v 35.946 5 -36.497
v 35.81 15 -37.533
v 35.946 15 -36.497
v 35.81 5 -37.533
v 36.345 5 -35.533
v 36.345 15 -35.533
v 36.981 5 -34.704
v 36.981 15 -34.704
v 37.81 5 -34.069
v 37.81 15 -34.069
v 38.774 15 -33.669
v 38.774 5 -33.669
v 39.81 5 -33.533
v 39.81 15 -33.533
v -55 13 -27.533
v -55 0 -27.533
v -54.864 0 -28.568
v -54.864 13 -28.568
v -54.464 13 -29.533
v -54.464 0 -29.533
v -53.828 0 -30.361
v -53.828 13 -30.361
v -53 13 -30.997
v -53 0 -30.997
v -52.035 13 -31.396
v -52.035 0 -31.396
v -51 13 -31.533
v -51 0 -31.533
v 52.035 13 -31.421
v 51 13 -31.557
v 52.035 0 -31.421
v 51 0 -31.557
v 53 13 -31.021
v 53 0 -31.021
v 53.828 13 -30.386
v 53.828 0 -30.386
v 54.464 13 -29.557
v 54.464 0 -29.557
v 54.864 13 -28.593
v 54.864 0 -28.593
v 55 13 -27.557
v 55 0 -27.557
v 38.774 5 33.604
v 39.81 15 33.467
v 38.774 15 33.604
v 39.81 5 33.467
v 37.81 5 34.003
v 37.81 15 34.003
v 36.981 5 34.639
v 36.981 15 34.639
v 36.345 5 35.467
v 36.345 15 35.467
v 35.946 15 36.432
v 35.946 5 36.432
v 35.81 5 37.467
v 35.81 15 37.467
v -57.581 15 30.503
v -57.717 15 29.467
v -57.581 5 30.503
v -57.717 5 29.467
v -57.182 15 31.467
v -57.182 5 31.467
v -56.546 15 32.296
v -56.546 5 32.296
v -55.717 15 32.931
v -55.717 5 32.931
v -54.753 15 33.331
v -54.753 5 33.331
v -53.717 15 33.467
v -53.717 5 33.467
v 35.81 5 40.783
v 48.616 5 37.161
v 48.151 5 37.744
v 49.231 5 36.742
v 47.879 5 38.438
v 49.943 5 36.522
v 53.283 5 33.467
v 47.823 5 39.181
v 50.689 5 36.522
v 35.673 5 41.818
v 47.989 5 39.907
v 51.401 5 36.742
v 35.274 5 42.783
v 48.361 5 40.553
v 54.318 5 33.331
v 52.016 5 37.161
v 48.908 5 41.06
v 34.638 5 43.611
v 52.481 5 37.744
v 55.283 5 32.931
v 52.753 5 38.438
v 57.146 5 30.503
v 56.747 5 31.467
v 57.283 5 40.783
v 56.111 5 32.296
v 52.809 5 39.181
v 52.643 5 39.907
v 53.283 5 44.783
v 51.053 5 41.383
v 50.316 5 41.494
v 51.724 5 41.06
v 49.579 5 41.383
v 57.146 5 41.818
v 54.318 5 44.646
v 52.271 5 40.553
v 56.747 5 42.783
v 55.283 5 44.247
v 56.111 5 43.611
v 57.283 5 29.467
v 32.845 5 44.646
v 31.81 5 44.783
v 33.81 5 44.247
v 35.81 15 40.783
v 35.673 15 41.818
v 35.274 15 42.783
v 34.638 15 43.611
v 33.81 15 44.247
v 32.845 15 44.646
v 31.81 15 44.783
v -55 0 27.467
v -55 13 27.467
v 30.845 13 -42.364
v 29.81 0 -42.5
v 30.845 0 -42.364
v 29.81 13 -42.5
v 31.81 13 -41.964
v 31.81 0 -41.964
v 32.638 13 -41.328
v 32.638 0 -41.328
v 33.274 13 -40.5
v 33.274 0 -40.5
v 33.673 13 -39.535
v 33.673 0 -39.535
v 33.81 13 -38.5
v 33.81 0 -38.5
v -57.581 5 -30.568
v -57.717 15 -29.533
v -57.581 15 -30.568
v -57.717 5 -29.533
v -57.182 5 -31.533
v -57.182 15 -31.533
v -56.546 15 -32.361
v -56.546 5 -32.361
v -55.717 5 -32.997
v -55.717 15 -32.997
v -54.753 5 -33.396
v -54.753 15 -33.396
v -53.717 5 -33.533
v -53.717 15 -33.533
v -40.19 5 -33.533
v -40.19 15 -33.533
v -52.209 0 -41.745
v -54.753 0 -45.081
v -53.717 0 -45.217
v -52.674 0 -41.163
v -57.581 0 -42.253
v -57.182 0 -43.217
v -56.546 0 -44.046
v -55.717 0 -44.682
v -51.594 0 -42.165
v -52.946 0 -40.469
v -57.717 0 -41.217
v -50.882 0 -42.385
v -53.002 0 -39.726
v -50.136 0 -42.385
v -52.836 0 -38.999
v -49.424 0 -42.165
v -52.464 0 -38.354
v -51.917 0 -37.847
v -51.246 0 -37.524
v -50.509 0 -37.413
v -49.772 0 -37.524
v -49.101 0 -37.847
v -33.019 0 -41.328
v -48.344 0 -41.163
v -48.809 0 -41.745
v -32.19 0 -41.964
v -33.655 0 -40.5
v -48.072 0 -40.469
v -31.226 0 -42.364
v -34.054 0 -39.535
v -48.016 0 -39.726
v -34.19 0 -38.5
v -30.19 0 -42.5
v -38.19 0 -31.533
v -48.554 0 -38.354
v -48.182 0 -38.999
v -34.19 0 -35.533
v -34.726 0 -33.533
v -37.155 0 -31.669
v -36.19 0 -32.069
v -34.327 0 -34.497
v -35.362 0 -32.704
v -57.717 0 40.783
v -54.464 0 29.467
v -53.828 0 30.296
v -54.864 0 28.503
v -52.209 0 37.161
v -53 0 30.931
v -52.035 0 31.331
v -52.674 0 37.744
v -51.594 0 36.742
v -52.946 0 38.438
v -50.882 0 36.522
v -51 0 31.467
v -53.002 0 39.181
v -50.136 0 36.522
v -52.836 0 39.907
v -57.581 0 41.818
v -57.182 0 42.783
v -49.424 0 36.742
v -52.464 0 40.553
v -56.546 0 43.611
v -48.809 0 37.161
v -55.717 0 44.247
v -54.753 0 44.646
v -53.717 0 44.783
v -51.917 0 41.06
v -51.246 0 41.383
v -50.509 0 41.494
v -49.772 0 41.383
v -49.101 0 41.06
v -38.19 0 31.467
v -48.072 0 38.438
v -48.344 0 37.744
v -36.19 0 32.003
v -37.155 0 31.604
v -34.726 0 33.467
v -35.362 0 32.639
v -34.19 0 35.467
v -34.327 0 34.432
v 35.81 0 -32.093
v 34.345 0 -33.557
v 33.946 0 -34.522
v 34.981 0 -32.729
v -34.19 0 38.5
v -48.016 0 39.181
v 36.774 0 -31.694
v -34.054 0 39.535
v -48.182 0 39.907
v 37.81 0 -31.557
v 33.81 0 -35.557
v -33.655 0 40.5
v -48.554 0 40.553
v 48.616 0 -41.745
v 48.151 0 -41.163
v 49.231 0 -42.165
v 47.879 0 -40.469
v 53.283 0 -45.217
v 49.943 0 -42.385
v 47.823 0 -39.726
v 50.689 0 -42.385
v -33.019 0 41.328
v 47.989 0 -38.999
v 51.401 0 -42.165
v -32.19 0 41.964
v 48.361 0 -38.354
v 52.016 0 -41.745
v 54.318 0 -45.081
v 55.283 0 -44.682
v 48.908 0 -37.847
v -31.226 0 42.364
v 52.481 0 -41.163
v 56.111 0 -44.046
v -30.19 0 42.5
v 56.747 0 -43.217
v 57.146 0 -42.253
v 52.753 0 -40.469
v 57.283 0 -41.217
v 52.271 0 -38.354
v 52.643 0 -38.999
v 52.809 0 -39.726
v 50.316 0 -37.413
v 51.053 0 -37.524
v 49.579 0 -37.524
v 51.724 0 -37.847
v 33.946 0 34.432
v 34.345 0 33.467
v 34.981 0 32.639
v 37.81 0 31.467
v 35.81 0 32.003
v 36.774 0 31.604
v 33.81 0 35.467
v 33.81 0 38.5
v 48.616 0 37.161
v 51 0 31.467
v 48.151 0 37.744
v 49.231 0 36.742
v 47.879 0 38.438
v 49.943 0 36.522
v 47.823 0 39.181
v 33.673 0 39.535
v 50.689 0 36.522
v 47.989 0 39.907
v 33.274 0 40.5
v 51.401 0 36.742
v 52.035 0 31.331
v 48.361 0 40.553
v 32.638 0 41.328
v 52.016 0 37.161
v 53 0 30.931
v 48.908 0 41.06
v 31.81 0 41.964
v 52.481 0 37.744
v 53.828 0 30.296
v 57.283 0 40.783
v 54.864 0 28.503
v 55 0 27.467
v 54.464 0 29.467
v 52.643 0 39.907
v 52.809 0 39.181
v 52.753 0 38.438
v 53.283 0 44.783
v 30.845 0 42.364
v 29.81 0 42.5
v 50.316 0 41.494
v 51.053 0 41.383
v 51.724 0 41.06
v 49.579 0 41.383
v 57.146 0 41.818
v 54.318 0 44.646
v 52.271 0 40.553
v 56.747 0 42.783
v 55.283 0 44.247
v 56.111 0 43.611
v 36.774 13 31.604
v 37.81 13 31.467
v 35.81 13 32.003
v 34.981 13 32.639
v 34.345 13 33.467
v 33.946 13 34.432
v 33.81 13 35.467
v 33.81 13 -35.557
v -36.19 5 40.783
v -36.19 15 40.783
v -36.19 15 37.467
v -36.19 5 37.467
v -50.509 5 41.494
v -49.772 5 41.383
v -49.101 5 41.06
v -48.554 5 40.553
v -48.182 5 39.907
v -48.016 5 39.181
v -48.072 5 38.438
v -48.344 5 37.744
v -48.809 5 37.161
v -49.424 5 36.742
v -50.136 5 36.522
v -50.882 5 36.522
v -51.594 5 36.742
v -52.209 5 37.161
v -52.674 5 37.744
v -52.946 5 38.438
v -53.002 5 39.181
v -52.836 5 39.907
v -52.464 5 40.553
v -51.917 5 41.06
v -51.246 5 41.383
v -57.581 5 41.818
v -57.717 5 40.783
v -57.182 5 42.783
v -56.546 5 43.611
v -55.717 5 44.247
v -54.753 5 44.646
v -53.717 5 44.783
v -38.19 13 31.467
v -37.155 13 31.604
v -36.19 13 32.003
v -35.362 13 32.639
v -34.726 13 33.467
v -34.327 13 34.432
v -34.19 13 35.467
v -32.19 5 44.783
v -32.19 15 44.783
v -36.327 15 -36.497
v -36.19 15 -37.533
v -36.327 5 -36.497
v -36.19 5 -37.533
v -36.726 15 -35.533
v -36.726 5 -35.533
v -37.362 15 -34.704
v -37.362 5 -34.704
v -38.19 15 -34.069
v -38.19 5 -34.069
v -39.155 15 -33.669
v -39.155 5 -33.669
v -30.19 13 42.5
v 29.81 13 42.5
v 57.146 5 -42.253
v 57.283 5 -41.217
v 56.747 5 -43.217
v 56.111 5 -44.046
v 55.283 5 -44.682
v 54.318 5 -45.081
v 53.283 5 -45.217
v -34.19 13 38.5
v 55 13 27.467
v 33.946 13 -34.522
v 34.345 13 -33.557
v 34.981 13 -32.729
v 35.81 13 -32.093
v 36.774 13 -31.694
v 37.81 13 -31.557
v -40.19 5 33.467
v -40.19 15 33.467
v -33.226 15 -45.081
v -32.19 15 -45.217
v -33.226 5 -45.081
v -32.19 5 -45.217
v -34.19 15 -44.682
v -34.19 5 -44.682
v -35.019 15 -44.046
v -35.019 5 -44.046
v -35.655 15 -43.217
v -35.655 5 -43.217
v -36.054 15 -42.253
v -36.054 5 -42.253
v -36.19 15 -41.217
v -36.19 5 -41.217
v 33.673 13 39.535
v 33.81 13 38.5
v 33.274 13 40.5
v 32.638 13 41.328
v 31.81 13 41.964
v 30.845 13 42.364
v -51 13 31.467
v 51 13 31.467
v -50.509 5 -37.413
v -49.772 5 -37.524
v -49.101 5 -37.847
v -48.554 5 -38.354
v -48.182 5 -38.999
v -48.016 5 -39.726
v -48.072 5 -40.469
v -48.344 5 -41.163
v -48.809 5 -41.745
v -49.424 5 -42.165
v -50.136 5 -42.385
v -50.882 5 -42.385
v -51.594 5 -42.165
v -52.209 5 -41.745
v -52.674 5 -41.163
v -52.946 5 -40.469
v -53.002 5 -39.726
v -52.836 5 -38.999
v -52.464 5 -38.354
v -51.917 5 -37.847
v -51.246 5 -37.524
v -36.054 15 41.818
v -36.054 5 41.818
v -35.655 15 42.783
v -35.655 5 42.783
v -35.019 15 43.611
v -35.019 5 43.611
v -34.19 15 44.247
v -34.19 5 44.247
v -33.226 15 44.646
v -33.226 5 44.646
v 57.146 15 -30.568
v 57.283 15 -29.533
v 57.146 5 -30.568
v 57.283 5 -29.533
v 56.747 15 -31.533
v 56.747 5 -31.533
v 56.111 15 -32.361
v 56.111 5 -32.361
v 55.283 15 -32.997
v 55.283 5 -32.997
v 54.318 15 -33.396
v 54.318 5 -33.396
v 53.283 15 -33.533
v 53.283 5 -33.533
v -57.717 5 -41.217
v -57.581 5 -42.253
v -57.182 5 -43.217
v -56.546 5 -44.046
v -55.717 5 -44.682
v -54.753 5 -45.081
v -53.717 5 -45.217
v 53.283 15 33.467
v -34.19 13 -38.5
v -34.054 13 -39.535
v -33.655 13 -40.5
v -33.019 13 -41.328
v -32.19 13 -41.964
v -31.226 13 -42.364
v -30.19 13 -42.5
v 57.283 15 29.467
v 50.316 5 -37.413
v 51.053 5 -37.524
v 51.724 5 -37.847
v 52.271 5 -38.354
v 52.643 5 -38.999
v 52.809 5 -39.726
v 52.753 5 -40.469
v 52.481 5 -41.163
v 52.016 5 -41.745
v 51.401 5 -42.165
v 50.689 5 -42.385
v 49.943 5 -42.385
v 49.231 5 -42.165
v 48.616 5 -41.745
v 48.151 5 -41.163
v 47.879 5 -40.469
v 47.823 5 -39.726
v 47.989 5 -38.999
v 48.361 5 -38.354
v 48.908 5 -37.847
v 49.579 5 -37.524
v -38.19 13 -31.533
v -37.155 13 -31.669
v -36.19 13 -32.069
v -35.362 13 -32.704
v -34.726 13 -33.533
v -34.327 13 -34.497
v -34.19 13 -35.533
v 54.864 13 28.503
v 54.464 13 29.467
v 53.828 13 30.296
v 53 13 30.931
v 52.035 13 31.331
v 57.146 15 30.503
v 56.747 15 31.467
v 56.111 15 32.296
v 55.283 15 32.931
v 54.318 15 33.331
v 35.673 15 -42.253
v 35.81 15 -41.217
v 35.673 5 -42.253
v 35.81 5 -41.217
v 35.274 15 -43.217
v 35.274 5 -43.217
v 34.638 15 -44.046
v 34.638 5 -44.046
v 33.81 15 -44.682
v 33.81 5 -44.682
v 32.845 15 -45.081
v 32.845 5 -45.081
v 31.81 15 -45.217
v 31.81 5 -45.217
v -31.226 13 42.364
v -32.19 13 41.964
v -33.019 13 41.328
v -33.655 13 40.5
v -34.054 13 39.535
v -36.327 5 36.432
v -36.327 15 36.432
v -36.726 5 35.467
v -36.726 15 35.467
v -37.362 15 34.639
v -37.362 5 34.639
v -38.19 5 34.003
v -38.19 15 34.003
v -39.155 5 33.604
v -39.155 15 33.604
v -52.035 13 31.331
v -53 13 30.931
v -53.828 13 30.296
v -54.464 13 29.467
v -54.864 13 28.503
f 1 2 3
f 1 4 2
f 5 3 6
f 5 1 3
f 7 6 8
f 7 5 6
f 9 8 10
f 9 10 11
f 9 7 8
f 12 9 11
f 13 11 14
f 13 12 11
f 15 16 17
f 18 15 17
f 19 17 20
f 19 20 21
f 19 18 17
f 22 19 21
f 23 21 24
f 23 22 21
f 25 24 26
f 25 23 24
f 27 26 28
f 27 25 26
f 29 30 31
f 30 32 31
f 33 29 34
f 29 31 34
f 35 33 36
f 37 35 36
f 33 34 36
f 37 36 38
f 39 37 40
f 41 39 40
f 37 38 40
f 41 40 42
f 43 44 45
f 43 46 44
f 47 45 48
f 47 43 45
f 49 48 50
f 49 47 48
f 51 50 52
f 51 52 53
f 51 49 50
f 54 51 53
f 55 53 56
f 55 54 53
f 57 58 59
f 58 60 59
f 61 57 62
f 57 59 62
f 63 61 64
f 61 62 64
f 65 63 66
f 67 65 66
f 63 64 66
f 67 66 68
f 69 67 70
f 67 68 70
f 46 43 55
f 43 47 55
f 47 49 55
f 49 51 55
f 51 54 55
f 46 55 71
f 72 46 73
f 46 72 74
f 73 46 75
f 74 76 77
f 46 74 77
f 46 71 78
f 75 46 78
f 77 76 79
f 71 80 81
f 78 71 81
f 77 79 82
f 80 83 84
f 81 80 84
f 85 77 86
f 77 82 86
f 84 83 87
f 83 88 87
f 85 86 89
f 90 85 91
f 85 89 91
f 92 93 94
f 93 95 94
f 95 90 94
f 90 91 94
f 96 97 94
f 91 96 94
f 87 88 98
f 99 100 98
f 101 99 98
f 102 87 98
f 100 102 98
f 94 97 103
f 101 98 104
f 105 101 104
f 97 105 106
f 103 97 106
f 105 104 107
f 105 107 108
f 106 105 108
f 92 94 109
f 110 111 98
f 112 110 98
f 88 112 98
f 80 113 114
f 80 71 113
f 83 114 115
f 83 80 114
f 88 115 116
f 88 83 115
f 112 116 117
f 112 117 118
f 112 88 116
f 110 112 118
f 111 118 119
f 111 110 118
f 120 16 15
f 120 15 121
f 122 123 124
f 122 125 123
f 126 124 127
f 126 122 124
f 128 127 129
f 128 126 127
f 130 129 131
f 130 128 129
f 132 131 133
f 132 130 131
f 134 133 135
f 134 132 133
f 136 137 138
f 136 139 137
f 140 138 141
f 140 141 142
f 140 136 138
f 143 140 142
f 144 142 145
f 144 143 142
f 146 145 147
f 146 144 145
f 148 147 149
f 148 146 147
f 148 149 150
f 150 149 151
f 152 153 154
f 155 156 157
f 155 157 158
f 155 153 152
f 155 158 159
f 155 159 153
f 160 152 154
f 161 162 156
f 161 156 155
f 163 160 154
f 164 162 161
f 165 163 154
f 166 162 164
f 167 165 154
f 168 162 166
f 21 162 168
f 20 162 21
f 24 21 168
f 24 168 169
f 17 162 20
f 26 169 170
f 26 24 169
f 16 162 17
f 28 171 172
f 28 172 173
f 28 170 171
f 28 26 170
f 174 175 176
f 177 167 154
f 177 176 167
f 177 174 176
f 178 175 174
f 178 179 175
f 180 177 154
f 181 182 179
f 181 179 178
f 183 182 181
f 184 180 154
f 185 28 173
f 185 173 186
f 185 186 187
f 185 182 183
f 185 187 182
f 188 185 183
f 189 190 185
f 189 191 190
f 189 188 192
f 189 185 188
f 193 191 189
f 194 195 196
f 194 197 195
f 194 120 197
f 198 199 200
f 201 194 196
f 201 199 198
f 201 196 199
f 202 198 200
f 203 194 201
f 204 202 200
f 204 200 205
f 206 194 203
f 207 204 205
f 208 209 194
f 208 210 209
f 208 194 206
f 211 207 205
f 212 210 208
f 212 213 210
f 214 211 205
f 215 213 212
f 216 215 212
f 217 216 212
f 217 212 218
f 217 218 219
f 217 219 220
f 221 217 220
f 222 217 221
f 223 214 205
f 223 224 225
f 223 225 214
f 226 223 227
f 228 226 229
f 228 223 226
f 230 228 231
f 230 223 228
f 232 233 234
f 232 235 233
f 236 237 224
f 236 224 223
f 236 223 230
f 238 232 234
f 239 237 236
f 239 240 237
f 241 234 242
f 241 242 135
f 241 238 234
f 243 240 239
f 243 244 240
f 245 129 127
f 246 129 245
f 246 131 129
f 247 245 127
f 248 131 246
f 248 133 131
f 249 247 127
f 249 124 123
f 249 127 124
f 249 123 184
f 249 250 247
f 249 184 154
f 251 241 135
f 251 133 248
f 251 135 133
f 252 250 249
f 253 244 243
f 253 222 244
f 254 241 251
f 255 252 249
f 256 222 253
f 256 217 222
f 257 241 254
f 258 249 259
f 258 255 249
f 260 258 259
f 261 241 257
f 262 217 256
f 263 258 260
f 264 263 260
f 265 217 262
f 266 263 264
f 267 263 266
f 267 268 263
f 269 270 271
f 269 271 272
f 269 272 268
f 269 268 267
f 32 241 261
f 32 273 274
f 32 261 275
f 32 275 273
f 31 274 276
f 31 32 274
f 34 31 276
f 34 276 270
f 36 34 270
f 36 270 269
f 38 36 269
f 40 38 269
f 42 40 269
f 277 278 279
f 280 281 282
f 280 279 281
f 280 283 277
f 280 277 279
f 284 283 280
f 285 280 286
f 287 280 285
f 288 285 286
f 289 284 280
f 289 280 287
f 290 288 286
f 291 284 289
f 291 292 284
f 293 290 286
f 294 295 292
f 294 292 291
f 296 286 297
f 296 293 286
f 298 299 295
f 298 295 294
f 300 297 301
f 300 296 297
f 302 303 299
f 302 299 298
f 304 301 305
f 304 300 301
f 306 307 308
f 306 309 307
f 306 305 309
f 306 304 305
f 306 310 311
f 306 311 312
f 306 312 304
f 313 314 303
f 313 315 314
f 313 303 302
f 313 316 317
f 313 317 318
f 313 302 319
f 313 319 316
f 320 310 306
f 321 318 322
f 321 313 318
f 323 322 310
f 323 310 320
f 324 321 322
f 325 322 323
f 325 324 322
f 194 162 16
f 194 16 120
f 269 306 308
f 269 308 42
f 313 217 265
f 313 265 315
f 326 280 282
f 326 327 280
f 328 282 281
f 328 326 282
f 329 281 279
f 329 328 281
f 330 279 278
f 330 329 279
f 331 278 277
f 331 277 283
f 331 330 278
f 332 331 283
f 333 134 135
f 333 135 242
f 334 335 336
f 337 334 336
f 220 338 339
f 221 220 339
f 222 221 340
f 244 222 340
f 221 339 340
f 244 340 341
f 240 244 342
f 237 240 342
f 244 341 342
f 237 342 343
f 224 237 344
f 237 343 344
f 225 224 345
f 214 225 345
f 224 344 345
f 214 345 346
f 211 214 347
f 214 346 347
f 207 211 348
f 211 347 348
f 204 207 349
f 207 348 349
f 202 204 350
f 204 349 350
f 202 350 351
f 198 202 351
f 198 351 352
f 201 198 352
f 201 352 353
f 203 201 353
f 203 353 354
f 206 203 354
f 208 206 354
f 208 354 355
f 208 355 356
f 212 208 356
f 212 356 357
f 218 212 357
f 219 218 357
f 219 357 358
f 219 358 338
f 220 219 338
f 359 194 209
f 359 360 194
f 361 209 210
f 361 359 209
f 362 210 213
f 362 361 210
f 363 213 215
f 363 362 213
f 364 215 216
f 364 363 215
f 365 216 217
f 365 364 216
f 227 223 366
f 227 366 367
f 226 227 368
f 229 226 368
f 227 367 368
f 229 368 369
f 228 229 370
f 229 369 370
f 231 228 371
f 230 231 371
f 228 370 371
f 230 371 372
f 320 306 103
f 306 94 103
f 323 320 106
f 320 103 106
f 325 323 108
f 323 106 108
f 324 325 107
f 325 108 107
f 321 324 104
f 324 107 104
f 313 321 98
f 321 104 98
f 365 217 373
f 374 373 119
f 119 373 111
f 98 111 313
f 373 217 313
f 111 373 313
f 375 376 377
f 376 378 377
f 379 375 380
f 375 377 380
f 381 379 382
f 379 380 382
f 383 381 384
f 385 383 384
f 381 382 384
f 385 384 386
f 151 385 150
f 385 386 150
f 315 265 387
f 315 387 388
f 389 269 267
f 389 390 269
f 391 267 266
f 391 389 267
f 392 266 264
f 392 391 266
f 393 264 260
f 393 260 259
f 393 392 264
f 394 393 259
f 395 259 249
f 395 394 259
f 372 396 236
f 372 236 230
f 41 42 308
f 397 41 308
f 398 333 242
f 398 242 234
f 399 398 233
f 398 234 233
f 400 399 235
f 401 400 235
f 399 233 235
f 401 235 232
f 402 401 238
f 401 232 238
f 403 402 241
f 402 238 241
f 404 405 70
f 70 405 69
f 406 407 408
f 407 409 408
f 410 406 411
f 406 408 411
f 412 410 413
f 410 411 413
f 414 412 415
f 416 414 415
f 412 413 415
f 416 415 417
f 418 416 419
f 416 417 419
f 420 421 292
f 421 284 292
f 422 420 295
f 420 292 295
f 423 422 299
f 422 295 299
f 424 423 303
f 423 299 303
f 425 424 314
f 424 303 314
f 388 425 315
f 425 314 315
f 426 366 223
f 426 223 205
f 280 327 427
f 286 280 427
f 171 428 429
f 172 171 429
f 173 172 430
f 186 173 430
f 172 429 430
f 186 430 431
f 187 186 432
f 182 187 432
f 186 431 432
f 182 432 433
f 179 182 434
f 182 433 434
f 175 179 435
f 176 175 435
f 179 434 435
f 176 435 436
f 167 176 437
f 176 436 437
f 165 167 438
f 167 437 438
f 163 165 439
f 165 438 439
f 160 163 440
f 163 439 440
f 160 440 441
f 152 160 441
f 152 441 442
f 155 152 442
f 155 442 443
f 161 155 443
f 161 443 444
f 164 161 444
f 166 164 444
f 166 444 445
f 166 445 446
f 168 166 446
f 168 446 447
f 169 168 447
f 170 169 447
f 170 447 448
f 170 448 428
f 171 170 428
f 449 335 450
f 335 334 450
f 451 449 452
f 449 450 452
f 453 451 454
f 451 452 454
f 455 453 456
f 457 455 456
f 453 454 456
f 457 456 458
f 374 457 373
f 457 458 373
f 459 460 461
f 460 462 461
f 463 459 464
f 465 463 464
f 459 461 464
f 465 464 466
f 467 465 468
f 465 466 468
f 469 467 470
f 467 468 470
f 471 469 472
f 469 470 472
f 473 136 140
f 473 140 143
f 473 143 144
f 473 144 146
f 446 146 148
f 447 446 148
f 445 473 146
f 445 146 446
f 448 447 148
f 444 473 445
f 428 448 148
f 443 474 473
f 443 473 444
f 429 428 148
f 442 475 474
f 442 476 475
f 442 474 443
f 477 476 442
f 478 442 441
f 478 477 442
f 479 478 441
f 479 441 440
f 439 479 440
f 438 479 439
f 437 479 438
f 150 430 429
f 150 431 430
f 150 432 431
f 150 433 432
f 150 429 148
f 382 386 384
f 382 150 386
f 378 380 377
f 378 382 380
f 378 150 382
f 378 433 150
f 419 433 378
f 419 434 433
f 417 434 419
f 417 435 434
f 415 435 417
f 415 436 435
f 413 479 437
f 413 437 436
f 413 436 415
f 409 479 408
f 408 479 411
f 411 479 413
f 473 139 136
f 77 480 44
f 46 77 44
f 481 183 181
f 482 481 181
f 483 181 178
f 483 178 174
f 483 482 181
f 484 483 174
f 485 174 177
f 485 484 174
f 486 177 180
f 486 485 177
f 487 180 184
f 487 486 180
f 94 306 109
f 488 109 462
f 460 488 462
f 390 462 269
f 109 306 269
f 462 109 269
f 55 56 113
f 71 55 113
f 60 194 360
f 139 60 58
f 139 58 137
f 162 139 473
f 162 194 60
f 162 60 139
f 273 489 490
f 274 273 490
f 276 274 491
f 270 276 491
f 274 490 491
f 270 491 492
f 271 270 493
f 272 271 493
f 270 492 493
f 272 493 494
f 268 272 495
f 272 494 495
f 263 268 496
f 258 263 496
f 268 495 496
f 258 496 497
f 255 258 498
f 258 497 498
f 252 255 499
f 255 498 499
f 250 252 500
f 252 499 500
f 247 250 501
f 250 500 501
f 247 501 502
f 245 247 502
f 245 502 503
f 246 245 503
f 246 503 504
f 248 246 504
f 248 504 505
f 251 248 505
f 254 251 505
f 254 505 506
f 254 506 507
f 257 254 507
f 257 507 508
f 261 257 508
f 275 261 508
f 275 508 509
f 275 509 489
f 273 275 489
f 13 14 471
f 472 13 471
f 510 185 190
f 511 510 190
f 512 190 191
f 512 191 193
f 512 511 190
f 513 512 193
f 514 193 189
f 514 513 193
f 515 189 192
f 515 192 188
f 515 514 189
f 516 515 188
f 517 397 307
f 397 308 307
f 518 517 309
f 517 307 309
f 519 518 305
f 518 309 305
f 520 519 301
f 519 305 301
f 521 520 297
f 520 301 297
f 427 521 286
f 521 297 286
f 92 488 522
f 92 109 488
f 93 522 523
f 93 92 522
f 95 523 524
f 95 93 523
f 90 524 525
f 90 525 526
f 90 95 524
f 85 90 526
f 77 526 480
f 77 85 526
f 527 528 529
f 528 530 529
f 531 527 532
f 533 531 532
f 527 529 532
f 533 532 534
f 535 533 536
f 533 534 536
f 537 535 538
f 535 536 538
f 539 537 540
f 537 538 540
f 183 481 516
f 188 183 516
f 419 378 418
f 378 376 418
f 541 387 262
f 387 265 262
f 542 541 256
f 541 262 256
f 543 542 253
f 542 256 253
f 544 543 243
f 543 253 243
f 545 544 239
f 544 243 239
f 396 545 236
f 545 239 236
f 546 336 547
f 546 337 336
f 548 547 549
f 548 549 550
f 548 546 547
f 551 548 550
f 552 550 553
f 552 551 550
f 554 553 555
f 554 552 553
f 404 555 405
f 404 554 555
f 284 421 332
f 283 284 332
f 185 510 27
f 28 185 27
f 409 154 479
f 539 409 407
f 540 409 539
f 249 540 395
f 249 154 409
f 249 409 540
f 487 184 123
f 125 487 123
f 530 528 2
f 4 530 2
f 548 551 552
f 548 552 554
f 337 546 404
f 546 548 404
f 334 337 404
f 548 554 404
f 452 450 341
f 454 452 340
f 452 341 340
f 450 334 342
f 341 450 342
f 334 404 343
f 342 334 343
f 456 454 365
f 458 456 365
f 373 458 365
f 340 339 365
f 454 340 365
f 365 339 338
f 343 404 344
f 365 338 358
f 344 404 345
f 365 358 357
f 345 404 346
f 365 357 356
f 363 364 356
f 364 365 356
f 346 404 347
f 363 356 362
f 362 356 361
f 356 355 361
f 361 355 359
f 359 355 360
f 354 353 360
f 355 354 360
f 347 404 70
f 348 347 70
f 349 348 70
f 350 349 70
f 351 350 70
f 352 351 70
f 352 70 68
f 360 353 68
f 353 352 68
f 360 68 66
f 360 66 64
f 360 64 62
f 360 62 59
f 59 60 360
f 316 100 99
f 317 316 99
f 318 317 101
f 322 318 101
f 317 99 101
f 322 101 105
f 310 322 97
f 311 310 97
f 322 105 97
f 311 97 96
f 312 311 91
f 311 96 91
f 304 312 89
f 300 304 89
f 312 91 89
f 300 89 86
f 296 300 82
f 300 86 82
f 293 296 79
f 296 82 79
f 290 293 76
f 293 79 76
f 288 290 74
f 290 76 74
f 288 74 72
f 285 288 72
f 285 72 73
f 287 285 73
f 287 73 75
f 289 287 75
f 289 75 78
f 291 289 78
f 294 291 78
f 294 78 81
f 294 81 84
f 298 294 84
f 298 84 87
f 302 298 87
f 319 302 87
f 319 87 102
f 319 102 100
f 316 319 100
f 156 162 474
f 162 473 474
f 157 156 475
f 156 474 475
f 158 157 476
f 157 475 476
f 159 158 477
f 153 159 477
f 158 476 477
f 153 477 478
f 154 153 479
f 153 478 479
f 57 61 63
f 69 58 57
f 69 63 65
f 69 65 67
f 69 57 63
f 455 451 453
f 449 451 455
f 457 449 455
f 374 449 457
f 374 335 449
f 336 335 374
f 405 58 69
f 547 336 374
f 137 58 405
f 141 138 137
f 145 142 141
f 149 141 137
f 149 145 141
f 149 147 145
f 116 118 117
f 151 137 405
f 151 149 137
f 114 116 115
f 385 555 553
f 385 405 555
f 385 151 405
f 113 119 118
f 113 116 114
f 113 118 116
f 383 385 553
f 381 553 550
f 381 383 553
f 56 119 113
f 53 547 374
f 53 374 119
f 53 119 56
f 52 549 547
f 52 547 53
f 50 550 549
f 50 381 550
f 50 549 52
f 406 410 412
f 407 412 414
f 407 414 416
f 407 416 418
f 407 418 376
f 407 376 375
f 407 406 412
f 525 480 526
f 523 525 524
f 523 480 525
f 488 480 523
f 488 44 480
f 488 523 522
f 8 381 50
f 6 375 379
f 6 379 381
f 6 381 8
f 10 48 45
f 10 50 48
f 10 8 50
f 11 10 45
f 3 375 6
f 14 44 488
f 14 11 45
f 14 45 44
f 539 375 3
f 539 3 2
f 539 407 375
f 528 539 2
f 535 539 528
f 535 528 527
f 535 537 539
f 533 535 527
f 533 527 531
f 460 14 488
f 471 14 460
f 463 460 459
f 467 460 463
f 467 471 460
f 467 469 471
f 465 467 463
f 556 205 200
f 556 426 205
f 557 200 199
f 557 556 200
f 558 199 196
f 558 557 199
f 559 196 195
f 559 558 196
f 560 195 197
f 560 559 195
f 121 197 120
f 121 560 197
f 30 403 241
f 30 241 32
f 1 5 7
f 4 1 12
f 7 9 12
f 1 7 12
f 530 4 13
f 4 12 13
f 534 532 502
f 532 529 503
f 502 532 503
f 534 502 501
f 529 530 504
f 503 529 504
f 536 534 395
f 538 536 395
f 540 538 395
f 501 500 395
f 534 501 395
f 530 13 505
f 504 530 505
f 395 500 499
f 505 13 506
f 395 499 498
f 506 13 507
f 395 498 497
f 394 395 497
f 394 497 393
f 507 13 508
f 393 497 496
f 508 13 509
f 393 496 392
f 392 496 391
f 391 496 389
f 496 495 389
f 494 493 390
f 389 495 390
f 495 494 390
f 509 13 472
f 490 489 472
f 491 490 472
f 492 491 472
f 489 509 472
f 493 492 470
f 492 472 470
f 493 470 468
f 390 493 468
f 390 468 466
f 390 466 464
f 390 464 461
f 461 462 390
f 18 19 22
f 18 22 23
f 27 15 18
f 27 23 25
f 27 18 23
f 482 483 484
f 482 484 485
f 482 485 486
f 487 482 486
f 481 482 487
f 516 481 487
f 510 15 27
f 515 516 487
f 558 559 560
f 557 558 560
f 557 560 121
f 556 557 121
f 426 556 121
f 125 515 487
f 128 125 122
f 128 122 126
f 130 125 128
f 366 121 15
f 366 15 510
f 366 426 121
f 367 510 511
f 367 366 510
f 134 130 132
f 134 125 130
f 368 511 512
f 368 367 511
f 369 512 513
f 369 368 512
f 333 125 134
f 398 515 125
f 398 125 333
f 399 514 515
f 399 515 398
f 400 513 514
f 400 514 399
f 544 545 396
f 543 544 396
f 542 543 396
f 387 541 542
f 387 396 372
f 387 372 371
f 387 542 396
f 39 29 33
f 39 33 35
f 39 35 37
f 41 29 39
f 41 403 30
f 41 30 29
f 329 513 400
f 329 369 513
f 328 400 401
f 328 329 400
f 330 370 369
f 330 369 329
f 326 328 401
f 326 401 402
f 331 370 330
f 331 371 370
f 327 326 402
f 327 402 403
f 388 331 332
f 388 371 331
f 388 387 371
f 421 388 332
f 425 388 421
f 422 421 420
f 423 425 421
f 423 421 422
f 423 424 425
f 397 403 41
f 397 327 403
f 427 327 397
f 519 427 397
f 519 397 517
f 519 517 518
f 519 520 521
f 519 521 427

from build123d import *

# Parameters (mm, degrees)
SKETCH_1_W          = 115
SKETCH_1_H          = 90
EXTRUDE_1_DEPTH     = 15
SKETCH_2_W          = 110
SKETCH_2_H          = 85
CUT_EXTRUDE_1_DEPTH = 13
SKETCH_4_R          = 2.5
CUT_EXTRUDE_2_DEPTH = 13
CUT_EXTRUDE_3_DEPTH = 10
EXTRUDE_2_DEPTH     = 13
SKETCH_8_W          = 23.526984817
SKETCH_8_H          = 13.315340632
SKETCH_8_W_2        = 23.473015183
SKETCH_8_H_2        = 13.660063904
SKETCH_8_H_3        = 13.684659368
EXTRUDE_4_DEPTH     = 5
FILLET_1_R          = 4
FILLET_2_R          = 4
SKETCH_9_R          = 2.5
CUT_EXTRUDE_4_DEPTH = 25


with BuildPart() as part:
    # Эскиз1 → Бобышка-Вытянуть1 (new body)
    with BuildSketch(Plane(origin=(0, 0, 0), x_dir=(1, 0, 0), z_dir=(0, 1, 0))):
        with Locations((-0.217418325, 0.217418325)):
            Rectangle(SKETCH_1_W, SKETCH_1_H)
    extrude(amount=EXTRUDE_1_DEPTH)

    # Эскиз2 → Вырез-Вытянуть1 (cut)
    with BuildSketch(Plane.XZ):
        Rectangle(SKETCH_2_W, SKETCH_2_H)
    extrude(amount=-CUT_EXTRUDE_1_DEPTH, mode=Mode.SUBTRACT)

    # Эскиз4 → Вырез-Вытянуть2 (cut)
    with BuildSketch(Plane(origin=(0, 15, 0), x_dir=(1, 0, 0), z_dir=(0, 1, 0))):
        with Locations(Location((-50.146124261, 38.945020388, 0), (0, 0, 270))):
            Circle(SKETCH_4_R)
        with Locations(Location((50.678785721, -39.961430902, 0), (0, 0, 270))):
            Circle(SKETCH_4_R)
        with Locations(Location((-50.146124261, -39.961430902, 0), (0, 0, 270))):
            Circle(SKETCH_4_R)
        with Locations(Location((50.678785721, 38.945020388, 0), (0, 0, 270))):
            Circle(SKETCH_4_R)
    extrude(amount=-CUT_EXTRUDE_2_DEPTH, mode=Mode.SUBTRACT)

    # Эскиз5 → Вырез-Вытянуть3 (cut)
    with BuildSketch(Plane(origin=(0, 15, 0), x_dir=(1, 0, 0), z_dir=(0, 1, 0))):
        Polygon((-56.190433508, 33.532758957), (-36.190433508, 33.532758957), (-36.190433508, 43.532758957), (-36.190433508, 45.217418325), (-57.717418325, 45.217418325), (-57.717418325, 33.532758957), align=None)
        Polygon((-56.190433508, -33.467241043), (-36.190433508, -33.467241043), (-36.190433508, -43.467241043), (-36.190433508, -44.782581675), (-57.717418325, -44.782581675), (-57.717418325, -33.467241043), align=None)
        Polygon((55.809566492, -33.467241043), (35.809566492, -33.467241043), (35.809566492, -43.467241043), (35.809566492, -44.782581675), (57.282581675, -44.782581675), (57.282581675, -33.467241043), align=None)
        Polygon((55.809566492, 33.532758957), (35.809566492, 33.532758957), (35.809566492, 43.532758957), (35.809566492, 45.217418325), (57.282581675, 45.217418325), (57.282581675, 33.532758957), align=None)
    extrude(amount=-CUT_EXTRUDE_3_DEPTH, mode=Mode.SUBTRACT)

    # Эскиз6 → Бобышка-Вытянуть2 (add)
    with BuildSketch(Plane.XZ.offset(-13)):
        Polygon((-55, -33.532758957), (-36.190433508, -33.532758957), (-36.190433508, -42.5), (-34.190433508, -42.5), (-34.190433508, -31.557354421), (-34.190433508, -31.532758957), (-35.500302021, -31.532758957), (-55, -31.532758957), align=None)
        Polygon((-36.190433508, 42.5), (-34.190433508, 42.5), (-34.190433508, 31.467241043), (-55, 31.467241043), (-55, 33.467241043), (-36.190433508, 33.467241043), align=None)
        Polygon((35.809566492, 42.5), (33.809566492, 42.5), (33.809566492, 31.467241043), (55, 31.467241043), (55, 33.467241043), (35.809566492, 33.467241043), align=None)
        Polygon((35.809566492, -42.5), (33.809566492, -42.5), (33.809566492, -31.557354421), (55, -31.557354421), (55, -33.532758957), (35.809566492, -33.532758957), align=None)
    extrude(amount=EXTRUDE_2_DEPTH)

    # Эскиз8 → Бобышка-Вытянуть4 (add)
    with BuildSketch(Plane.XZ):
        with Locations((-45.953925917, 38.124911359)):
            Rectangle(SKETCH_8_W, SKETCH_8_H)
        with Locations((45.546074084, 38.124911359)):
            Rectangle(SKETCH_8_W_2, SKETCH_8_H)
        with Locations((45.546074084, -38.387386373)):
            Rectangle(SKETCH_8_W_2, SKETCH_8_H_2)
        with Locations((-45.953925917, -38.375088641)):
            Rectangle(SKETCH_8_W, SKETCH_8_H_3)
    extrude(amount=-EXTRUDE_4_DEPTH)

    # Скругление1
    fillet_1_edges = [part.edges().sort_by_distance(p)[0] for p in [
        (-57.717418325, 10, 33.467241043),
        (-36.190433508, 10, 44.782581675),
        (-36.190433508, 10, -45.217418325),
        (-57.717418325, 10, -33.532758957),
        (-36.190433508, 10, 33.467241043),
        (35.809566492, 10, 33.467241043),
        (35.809566492, 10, -33.532758957),
        (-36.190433508, 10, -33.532758957),
        (57.282581675, 2.5, 44.782581675),
        (-57.717418325, 2.5, 44.782581675),
        (-57.717418325, 2.5, -45.217418325),
        (57.282581675, 2.5, -45.217418325),
        (57.282581675, 10, -33.532758957),
        (35.809566492, 10, -45.217418325),
        (35.809566492, 10, 44.782581675),
        (57.282581675, 10, 33.467241043),
    ]]
    fillet(fillet_1_edges, radius=FILLET_1_R)

    # Скругление2
    fillet_2_edges = [part.edges().sort_by_distance(p)[0] for p in [
        (-55, 6.5, -31.532758957),
        (-34.190433508, 6.5, -42.5),
        (-34.190433508, 6.5, -31.532758957),
        (-55, 6.5, 31.467241043),
        (-34.190433508, 6.5, 31.467241043),
        (-34.190433508, 6.5, 42.5),
        (33.809566492, 6.5, 42.5),
        (33.809566492, 6.5, 31.467241043),
        (55, 6.5, 31.467241043),
        (55, 6.5, -31.557354421),
        (33.809566492, 6.5, -31.557354421),
        (33.809566492, 6.5, -42.5),
    ]]
    fillet(fillet_2_edges, radius=FILLET_2_R)

    # Эскиз9 → Вырез-Вытянуть4 (cut)
    with BuildSketch(Plane(origin=(0, 15, 0), x_dir=(1, 0, 0), z_dir=(0, 1, 0))):
        with Locations(Location((-50.508936052, 39.912518498, 0), (0, 0, 270))):
            Circle(SKETCH_9_R)
        with Locations(Location((50.315973929, -38.993932792, 0), (0, 0, 270))):
            Circle(SKETCH_9_R)
        with Locations(Location((-50.508936052, -38.993932792, 0), (0, 0, 270))):
            Circle(SKETCH_9_R)
        with Locations(Location((50.315973929, 39.912518498, 0), (0, 0, 270))):
            Circle(SKETCH_9_R)
    extrude(amount=-CUT_EXTRUDE_4_DEPTH, mode=Mode.SUBTRACT)


solid = part.part
